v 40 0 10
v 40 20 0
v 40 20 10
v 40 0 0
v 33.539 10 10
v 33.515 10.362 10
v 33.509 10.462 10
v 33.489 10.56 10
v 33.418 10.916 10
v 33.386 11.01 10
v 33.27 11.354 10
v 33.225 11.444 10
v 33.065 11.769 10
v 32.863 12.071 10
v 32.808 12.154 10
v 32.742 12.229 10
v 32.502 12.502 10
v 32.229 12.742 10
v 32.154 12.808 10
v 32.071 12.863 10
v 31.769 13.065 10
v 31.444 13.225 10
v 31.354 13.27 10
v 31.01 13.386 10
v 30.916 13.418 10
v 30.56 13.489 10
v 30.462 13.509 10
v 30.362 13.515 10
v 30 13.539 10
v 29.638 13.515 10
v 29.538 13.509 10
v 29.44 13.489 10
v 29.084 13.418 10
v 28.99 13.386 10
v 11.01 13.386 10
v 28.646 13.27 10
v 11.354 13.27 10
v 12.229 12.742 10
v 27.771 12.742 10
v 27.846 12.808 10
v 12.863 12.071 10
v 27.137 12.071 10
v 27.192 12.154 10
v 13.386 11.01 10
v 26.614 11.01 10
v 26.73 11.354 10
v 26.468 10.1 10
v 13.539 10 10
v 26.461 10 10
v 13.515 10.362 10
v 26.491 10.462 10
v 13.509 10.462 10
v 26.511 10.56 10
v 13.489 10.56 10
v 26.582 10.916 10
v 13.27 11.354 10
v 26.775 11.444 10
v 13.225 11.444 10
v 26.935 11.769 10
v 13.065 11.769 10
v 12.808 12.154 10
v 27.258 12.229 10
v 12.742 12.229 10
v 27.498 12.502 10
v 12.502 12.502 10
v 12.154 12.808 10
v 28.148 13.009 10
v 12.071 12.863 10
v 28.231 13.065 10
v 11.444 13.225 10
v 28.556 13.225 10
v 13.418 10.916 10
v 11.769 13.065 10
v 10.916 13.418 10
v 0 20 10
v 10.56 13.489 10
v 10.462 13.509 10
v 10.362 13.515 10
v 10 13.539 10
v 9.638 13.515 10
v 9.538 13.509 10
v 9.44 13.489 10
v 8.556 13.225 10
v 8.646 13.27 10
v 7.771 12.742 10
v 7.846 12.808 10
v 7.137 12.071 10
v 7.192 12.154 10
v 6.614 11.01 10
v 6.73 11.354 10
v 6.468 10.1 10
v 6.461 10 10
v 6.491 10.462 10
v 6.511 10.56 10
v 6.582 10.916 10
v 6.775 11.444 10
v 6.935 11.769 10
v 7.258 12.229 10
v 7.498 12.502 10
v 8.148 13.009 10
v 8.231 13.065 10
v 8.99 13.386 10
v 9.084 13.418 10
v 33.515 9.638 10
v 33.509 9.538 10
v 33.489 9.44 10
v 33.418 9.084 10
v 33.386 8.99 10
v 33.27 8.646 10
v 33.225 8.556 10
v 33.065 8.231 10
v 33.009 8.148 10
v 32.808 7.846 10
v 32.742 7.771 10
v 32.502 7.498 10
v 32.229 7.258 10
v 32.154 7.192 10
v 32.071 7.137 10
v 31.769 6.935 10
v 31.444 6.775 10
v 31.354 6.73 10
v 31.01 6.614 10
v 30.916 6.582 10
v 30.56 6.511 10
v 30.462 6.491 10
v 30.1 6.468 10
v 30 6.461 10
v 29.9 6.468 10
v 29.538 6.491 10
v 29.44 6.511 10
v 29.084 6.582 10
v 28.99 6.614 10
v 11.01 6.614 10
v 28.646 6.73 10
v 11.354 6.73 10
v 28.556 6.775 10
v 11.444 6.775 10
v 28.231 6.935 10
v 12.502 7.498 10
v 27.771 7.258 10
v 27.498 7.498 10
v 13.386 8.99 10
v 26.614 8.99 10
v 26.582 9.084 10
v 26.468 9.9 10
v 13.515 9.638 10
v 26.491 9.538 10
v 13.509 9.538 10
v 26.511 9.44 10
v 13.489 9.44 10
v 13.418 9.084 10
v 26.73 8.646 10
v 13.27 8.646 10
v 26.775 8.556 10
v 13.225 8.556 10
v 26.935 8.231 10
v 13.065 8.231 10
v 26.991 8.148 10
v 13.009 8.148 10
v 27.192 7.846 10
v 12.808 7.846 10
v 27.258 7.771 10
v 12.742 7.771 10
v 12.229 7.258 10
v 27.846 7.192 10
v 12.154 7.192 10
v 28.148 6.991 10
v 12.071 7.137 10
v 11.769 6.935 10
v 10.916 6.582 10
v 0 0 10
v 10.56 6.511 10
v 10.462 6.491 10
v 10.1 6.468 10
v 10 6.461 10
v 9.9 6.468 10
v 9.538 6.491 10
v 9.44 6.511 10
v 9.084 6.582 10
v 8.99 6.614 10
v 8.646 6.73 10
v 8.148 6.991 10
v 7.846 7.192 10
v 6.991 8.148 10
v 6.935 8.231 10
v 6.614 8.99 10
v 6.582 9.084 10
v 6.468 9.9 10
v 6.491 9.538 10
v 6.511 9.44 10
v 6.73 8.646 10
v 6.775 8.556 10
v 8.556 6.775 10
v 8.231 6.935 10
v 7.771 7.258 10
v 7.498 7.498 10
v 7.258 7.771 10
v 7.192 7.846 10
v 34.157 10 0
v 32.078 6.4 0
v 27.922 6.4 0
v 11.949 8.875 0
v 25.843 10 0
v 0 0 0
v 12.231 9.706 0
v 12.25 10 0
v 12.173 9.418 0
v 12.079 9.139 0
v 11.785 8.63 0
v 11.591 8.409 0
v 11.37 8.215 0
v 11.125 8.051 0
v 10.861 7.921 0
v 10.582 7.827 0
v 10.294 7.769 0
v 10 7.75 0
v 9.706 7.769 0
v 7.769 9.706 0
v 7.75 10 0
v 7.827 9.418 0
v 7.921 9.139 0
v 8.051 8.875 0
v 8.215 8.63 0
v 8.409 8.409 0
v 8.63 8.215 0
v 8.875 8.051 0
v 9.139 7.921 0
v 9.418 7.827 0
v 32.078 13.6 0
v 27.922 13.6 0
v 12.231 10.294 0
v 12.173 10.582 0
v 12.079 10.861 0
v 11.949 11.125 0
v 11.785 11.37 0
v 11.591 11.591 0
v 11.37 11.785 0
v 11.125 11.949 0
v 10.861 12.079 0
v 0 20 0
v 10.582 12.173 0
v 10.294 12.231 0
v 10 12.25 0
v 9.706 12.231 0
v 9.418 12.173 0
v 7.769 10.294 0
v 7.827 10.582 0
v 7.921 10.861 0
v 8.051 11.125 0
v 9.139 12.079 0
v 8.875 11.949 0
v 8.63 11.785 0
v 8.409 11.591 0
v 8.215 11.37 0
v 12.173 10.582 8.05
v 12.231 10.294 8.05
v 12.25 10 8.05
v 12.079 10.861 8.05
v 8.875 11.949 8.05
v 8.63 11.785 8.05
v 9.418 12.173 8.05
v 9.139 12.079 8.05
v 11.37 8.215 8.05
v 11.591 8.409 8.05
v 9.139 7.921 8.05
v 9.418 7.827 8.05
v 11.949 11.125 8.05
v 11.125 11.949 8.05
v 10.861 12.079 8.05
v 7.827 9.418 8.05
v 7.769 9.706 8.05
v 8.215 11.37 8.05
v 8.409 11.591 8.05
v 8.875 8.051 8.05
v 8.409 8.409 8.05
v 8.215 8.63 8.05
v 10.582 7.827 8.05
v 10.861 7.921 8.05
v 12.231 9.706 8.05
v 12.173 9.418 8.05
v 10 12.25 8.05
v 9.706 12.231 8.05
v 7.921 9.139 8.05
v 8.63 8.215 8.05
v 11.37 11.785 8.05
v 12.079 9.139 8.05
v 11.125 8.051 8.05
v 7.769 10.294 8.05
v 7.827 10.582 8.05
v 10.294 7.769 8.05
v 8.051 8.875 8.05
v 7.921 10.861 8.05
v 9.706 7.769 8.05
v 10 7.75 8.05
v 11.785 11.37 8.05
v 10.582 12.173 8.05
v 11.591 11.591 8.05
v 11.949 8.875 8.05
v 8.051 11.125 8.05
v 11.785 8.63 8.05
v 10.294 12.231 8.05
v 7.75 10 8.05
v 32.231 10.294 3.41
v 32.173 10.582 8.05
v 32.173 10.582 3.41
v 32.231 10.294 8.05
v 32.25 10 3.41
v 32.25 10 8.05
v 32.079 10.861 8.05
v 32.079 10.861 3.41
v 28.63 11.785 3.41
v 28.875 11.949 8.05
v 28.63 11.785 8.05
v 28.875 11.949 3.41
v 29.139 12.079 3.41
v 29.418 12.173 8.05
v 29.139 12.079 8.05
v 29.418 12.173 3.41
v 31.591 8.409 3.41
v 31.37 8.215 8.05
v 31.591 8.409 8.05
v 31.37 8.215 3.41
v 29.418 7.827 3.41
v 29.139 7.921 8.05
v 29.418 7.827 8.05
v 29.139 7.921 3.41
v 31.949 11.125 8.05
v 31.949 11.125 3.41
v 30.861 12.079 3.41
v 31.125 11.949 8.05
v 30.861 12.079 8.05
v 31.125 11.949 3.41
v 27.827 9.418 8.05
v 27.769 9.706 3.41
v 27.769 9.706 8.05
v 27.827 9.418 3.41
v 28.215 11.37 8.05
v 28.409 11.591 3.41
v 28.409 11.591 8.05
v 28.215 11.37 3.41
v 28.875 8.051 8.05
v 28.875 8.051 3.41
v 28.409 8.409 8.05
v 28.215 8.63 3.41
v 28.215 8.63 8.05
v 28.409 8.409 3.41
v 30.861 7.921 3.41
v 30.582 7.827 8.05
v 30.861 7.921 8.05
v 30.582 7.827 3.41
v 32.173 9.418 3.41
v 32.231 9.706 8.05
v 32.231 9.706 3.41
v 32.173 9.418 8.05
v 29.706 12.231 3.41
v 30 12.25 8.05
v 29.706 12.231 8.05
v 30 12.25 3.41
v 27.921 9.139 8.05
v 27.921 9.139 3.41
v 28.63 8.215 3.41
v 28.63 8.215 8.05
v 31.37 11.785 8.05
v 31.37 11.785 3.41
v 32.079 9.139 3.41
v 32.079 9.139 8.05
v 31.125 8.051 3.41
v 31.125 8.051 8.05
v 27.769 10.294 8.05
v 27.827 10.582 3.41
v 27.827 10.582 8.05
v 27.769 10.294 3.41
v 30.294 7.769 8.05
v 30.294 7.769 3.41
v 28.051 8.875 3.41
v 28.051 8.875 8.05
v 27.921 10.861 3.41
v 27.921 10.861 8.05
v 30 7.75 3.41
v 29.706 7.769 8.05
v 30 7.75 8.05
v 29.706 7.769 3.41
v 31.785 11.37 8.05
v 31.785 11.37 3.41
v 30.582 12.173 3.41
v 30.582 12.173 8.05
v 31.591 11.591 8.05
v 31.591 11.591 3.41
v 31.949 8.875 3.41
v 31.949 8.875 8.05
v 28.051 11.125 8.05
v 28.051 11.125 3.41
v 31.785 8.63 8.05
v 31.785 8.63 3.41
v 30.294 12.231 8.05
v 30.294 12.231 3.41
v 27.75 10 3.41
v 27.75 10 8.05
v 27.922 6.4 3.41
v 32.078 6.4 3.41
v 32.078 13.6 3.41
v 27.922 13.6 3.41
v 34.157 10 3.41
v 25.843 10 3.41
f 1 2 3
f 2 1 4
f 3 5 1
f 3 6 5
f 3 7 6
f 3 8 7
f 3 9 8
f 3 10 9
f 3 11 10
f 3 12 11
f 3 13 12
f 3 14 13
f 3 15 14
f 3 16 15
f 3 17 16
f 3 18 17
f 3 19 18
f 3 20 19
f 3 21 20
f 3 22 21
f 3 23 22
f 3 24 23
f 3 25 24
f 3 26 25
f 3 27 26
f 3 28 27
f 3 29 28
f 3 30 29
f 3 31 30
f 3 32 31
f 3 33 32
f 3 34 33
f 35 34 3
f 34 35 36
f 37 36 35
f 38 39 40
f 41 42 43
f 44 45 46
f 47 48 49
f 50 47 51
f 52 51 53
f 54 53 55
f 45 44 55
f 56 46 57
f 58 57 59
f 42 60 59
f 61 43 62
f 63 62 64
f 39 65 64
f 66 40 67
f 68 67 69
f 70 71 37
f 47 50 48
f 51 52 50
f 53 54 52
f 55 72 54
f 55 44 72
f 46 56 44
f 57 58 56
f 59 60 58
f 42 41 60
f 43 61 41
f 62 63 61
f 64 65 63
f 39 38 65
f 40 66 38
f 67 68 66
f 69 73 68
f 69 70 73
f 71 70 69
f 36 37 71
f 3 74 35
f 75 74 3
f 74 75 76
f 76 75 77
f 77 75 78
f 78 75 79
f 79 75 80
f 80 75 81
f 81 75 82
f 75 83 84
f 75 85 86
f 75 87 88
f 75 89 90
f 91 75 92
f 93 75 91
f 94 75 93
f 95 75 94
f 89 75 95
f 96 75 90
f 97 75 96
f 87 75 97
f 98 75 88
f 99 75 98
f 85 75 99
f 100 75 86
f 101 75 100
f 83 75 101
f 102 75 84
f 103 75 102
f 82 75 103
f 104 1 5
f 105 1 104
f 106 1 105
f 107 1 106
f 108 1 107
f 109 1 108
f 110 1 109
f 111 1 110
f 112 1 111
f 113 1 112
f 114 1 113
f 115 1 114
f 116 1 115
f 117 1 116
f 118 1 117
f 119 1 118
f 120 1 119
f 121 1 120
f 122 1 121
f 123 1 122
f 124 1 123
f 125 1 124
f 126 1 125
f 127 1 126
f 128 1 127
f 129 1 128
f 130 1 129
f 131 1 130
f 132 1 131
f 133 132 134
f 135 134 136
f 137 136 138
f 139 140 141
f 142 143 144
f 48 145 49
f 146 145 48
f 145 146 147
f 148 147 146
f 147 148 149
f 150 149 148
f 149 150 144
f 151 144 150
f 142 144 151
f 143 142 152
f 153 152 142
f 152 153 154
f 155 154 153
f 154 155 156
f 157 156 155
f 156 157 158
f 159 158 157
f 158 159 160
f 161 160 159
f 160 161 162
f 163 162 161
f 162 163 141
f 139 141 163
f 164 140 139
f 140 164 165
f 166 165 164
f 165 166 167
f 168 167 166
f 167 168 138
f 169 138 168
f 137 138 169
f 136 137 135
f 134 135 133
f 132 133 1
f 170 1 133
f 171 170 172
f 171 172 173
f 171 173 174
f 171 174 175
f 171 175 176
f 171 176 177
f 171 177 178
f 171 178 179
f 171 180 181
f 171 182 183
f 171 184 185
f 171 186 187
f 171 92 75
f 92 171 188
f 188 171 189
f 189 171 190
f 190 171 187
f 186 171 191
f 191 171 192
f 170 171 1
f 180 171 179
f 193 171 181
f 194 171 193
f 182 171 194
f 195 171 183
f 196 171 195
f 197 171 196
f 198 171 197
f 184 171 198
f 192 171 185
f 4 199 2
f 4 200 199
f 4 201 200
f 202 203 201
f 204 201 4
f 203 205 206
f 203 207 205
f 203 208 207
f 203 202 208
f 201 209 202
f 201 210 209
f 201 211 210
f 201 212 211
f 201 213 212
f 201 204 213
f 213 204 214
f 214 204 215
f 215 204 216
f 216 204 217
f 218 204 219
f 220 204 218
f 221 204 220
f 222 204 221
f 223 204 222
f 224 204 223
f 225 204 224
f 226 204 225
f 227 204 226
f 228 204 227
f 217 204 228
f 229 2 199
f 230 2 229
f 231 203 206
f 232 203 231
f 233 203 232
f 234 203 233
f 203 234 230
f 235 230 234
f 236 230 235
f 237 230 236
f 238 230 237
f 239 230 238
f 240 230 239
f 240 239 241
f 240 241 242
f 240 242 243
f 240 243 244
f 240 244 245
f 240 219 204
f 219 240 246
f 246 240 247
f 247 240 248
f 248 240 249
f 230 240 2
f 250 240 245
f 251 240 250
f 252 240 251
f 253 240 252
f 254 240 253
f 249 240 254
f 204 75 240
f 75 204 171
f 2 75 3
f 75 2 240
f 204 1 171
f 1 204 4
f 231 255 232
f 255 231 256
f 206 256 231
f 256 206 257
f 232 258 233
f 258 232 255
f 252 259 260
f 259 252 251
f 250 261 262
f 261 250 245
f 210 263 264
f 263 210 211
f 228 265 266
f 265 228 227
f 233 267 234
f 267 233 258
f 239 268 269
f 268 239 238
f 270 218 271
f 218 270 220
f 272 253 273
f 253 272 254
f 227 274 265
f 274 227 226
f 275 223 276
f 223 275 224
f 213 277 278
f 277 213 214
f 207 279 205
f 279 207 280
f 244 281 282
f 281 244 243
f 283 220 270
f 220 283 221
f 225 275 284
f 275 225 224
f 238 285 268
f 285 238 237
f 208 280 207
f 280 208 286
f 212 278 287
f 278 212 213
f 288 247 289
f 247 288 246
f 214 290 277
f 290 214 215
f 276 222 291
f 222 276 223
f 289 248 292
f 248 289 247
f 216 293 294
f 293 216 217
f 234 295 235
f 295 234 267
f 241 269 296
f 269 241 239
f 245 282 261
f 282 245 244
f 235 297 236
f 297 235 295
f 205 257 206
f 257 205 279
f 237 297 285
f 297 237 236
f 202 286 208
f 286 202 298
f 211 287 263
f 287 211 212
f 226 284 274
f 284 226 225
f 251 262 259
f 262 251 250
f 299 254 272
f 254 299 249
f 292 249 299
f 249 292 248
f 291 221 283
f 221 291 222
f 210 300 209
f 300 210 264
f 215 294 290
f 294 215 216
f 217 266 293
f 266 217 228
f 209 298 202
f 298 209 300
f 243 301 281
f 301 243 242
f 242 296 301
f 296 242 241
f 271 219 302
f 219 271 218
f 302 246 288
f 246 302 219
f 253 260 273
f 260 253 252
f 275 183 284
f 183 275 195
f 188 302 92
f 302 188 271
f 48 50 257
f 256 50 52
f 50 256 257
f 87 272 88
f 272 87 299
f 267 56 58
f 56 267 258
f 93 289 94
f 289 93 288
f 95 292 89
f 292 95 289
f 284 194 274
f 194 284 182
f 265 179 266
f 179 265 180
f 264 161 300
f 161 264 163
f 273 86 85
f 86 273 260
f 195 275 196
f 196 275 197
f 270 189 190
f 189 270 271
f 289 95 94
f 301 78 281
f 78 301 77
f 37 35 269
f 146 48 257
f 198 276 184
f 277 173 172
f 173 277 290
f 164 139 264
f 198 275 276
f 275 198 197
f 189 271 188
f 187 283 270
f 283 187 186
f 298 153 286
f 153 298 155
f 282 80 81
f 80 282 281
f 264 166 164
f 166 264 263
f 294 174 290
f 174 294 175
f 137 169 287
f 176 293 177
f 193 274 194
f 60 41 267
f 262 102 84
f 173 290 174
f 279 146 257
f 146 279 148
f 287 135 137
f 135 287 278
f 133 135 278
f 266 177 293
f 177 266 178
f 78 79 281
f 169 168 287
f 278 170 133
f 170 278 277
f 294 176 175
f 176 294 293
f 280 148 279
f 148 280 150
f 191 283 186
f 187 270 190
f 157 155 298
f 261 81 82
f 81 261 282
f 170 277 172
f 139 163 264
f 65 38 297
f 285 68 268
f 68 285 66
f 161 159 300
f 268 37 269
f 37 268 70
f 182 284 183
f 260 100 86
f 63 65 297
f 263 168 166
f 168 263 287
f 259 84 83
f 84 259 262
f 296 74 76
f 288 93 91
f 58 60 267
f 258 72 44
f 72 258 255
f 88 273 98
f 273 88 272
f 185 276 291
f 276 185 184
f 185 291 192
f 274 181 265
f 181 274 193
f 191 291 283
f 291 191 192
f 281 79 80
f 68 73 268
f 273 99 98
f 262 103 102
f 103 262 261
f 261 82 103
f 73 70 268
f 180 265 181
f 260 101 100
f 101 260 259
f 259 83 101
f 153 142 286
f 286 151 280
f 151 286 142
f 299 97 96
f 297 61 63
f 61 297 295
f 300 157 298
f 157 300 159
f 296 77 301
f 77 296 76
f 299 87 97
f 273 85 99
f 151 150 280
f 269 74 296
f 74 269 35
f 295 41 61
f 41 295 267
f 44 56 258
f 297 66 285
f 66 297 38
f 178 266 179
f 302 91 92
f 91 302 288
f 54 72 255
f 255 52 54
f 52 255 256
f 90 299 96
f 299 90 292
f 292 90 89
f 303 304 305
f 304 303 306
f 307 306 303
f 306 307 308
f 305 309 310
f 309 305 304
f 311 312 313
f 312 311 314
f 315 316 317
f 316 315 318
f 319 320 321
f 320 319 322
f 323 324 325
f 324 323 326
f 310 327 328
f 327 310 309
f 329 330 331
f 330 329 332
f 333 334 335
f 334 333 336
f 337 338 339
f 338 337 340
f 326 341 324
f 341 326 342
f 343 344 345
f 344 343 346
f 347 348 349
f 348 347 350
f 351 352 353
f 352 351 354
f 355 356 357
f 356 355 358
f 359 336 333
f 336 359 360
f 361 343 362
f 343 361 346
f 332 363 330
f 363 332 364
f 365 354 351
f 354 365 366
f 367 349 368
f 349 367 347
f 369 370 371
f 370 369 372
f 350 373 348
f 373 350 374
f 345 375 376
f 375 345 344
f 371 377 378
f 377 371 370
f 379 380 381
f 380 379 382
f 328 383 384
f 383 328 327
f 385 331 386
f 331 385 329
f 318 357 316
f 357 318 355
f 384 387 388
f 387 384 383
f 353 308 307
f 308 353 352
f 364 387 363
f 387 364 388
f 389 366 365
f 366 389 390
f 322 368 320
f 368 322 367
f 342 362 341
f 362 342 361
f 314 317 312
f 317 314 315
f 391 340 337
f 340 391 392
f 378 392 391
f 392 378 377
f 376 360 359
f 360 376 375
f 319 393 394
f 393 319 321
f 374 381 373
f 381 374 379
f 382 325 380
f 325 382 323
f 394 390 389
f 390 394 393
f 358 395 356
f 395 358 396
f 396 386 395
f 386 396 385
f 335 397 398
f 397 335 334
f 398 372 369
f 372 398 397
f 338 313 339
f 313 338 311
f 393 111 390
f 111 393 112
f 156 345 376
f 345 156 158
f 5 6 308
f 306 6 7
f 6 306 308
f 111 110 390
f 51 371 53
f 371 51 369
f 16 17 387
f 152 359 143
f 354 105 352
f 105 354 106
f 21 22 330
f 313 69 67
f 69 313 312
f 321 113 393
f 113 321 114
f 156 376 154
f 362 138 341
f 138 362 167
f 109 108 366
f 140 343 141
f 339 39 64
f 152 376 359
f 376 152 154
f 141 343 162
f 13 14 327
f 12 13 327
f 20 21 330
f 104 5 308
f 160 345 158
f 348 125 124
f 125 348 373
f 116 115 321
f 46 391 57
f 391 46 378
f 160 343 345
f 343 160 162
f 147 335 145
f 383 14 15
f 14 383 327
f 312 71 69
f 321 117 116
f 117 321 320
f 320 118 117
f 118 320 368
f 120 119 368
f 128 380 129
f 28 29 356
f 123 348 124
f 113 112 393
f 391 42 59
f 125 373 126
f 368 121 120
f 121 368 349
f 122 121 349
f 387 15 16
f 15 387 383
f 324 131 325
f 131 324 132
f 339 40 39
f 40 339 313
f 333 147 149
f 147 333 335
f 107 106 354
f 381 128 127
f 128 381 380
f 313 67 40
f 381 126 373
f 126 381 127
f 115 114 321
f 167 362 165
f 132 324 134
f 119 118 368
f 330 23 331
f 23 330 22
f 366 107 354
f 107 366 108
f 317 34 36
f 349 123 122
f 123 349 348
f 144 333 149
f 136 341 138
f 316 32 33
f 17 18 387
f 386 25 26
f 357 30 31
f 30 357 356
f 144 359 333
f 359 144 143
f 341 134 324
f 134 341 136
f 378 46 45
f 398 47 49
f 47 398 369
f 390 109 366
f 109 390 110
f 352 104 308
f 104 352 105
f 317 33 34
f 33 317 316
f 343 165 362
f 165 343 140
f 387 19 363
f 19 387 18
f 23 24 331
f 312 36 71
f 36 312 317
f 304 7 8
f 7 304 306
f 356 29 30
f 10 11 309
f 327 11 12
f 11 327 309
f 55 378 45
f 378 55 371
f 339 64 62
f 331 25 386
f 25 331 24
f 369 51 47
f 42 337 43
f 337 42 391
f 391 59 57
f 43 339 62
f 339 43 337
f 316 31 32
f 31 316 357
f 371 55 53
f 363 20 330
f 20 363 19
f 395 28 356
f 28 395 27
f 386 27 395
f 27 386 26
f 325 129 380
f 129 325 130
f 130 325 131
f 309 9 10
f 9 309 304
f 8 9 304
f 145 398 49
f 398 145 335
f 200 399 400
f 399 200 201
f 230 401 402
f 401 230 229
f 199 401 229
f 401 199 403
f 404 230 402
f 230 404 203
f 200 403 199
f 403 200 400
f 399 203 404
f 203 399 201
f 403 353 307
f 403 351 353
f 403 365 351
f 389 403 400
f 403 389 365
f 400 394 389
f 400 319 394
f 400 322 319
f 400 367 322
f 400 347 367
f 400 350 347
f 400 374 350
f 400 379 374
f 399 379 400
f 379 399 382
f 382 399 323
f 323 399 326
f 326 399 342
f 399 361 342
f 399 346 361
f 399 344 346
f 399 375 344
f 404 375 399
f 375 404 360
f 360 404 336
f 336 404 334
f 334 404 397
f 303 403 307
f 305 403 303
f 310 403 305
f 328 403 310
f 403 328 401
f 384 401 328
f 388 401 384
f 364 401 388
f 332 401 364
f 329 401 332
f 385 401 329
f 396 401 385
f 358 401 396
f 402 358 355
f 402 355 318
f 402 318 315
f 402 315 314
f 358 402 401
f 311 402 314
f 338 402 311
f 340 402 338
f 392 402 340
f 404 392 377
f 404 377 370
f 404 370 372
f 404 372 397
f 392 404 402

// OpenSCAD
/*
	fastener-m4 — M4 沉头孔 + 螺母槽样件

	测什么
		一块 40×20×10 的样件，左边一个 M4 沉头通孔（平头螺钉），
		右边一个 M4 通孔 + 六角螺母槽（从底面塞螺母）。
		这两处正是挂钩、挂板这类件的受力点：沉头能不能让螺钉平齐，
		螺母槽能不能让螺母卡住不打转。

	怎么判读
		- 螺钉头应完全沉入、与顶面平齐：沉不下去 = 沉头锥角/深度不够；
		  沉下去但晃 = 通孔偏大。
		- 螺母从底面塞入应"卡住、不掉、不打转"：太紧塞不进（孔偏小），
		  太松会打转（槽偏大）。M4 螺母对边 7.0 mm，这里给 7.2 mm 余量。
		- 螺母槽顶面是水平朝下的面，会被 print3d_check 算作真悬垂——
		  这是正常的（螺母槽顶就是一段小桥），<0.5 cm² 一般不用支撑。
		- 通孔 4.5 mm 是 FDM 上的常用 M4 间隙孔；如果螺钉穿不进，
		  把 hole_d 调到 4.6–4.8 再导出一次。
		- 沉头深度按 90° 沉头自动算：(head_d - hole_d) / 2，不用手填角度。

	期望值（默认参数）
		STL 体积 7.353 cm³，包围盒 40.00 × 20.00 × 10.00 mm，单实体，水密。
		真悬垂 ≈0.29 cm²（螺母槽顶面减去通孔）。
		沉头深 1.95 mm，螺母槽深 3.41 mm、六角对边 7.20 mm。

	参数
		hole_d       M4 通孔直径 (mm)
		head_d       M4 平头最大直径 (mm)
		nut_af       六角螺母对边 (mm)
		nut_h        螺母槽深 (mm)
		block_w/d/h  样件宽 / 深 / 高 (mm)
		csk_x        沉头孔中心 X
		nut_x        螺母槽中心 X
		fn           圆周分段数
*/

/* [M4 通孔 / 沉头] */
hole_d = 4.5;     // 通孔直径 (mm)
head_d = 8.4;     // 平头最大直径 (mm)：M4 内六角平头约 8.0–8.4

/* [M4 螺母槽] */
nut_af = 7.2;     // 六角对边 (mm)：M4 标准螺母 7.0，留 0.2 余量
nut_h = 3.4;      // 槽深 (mm)：螺母厚 3.2 + 0.2

/* [块体] */
block_w = 40;     // X
block_d = 20;     // Y
block_h = 10;     // Z

/* [布局] */
csk_x = 10;       // 沉头孔中心 X
nut_x = 30;       // 螺母槽中心 X

/* [网格] */
fn = 48;

// 90° 沉头：锥高由头径和孔径共同决定
csk_h = (head_d - hole_d) / 2;

assert(head_d > hole_d, "head_d 必须大于 hole_d");
assert(nut_h < block_h, "nut_h 必须小于块高，槽才能从底面往上留顶");
assert(csk_x > hole_d && csk_x < block_w - hole_d, "csk_x 超出块体");
assert(nut_x > nut_af / 2 && nut_x < block_w - nut_af / 2, "nut_x 超出块体");

module m4_sample() {
	difference() {
		cube([block_w, block_d, block_h]);

		// 左边：通孔
		translate([csk_x, block_d / 2, -1])
			cylinder(h = block_h + 2, d = hole_d, $fn = fn);
		// 左边：90° 沉头锥（d1 在下、d2 在上 → 从顶面向下张开）
		translate([csk_x, block_d / 2, block_h - csk_h])
			cylinder(h = csk_h + 1, d1 = hole_d, d2 = head_d, $fn = fn);

		// 右边：通孔 + 沉头
		translate([nut_x, block_d / 2, -1])
			cylinder(h = block_h + 2, d = hole_d, $fn = fn);
		translate([nut_x, block_d / 2, block_h - csk_h])
			cylinder(h = csk_h + 1, d1 = hole_d, d2 = head_d, $fn = fn);
		// 右边：六角螺母槽，从底面往上挖；$fn=6 的"直径"是对角尺寸
		translate([nut_x, block_d / 2, -1])
			cylinder(h = nut_h + 1.01, d = nut_af / cos(30), $fn = 6);
	}
}

m4_sample();
